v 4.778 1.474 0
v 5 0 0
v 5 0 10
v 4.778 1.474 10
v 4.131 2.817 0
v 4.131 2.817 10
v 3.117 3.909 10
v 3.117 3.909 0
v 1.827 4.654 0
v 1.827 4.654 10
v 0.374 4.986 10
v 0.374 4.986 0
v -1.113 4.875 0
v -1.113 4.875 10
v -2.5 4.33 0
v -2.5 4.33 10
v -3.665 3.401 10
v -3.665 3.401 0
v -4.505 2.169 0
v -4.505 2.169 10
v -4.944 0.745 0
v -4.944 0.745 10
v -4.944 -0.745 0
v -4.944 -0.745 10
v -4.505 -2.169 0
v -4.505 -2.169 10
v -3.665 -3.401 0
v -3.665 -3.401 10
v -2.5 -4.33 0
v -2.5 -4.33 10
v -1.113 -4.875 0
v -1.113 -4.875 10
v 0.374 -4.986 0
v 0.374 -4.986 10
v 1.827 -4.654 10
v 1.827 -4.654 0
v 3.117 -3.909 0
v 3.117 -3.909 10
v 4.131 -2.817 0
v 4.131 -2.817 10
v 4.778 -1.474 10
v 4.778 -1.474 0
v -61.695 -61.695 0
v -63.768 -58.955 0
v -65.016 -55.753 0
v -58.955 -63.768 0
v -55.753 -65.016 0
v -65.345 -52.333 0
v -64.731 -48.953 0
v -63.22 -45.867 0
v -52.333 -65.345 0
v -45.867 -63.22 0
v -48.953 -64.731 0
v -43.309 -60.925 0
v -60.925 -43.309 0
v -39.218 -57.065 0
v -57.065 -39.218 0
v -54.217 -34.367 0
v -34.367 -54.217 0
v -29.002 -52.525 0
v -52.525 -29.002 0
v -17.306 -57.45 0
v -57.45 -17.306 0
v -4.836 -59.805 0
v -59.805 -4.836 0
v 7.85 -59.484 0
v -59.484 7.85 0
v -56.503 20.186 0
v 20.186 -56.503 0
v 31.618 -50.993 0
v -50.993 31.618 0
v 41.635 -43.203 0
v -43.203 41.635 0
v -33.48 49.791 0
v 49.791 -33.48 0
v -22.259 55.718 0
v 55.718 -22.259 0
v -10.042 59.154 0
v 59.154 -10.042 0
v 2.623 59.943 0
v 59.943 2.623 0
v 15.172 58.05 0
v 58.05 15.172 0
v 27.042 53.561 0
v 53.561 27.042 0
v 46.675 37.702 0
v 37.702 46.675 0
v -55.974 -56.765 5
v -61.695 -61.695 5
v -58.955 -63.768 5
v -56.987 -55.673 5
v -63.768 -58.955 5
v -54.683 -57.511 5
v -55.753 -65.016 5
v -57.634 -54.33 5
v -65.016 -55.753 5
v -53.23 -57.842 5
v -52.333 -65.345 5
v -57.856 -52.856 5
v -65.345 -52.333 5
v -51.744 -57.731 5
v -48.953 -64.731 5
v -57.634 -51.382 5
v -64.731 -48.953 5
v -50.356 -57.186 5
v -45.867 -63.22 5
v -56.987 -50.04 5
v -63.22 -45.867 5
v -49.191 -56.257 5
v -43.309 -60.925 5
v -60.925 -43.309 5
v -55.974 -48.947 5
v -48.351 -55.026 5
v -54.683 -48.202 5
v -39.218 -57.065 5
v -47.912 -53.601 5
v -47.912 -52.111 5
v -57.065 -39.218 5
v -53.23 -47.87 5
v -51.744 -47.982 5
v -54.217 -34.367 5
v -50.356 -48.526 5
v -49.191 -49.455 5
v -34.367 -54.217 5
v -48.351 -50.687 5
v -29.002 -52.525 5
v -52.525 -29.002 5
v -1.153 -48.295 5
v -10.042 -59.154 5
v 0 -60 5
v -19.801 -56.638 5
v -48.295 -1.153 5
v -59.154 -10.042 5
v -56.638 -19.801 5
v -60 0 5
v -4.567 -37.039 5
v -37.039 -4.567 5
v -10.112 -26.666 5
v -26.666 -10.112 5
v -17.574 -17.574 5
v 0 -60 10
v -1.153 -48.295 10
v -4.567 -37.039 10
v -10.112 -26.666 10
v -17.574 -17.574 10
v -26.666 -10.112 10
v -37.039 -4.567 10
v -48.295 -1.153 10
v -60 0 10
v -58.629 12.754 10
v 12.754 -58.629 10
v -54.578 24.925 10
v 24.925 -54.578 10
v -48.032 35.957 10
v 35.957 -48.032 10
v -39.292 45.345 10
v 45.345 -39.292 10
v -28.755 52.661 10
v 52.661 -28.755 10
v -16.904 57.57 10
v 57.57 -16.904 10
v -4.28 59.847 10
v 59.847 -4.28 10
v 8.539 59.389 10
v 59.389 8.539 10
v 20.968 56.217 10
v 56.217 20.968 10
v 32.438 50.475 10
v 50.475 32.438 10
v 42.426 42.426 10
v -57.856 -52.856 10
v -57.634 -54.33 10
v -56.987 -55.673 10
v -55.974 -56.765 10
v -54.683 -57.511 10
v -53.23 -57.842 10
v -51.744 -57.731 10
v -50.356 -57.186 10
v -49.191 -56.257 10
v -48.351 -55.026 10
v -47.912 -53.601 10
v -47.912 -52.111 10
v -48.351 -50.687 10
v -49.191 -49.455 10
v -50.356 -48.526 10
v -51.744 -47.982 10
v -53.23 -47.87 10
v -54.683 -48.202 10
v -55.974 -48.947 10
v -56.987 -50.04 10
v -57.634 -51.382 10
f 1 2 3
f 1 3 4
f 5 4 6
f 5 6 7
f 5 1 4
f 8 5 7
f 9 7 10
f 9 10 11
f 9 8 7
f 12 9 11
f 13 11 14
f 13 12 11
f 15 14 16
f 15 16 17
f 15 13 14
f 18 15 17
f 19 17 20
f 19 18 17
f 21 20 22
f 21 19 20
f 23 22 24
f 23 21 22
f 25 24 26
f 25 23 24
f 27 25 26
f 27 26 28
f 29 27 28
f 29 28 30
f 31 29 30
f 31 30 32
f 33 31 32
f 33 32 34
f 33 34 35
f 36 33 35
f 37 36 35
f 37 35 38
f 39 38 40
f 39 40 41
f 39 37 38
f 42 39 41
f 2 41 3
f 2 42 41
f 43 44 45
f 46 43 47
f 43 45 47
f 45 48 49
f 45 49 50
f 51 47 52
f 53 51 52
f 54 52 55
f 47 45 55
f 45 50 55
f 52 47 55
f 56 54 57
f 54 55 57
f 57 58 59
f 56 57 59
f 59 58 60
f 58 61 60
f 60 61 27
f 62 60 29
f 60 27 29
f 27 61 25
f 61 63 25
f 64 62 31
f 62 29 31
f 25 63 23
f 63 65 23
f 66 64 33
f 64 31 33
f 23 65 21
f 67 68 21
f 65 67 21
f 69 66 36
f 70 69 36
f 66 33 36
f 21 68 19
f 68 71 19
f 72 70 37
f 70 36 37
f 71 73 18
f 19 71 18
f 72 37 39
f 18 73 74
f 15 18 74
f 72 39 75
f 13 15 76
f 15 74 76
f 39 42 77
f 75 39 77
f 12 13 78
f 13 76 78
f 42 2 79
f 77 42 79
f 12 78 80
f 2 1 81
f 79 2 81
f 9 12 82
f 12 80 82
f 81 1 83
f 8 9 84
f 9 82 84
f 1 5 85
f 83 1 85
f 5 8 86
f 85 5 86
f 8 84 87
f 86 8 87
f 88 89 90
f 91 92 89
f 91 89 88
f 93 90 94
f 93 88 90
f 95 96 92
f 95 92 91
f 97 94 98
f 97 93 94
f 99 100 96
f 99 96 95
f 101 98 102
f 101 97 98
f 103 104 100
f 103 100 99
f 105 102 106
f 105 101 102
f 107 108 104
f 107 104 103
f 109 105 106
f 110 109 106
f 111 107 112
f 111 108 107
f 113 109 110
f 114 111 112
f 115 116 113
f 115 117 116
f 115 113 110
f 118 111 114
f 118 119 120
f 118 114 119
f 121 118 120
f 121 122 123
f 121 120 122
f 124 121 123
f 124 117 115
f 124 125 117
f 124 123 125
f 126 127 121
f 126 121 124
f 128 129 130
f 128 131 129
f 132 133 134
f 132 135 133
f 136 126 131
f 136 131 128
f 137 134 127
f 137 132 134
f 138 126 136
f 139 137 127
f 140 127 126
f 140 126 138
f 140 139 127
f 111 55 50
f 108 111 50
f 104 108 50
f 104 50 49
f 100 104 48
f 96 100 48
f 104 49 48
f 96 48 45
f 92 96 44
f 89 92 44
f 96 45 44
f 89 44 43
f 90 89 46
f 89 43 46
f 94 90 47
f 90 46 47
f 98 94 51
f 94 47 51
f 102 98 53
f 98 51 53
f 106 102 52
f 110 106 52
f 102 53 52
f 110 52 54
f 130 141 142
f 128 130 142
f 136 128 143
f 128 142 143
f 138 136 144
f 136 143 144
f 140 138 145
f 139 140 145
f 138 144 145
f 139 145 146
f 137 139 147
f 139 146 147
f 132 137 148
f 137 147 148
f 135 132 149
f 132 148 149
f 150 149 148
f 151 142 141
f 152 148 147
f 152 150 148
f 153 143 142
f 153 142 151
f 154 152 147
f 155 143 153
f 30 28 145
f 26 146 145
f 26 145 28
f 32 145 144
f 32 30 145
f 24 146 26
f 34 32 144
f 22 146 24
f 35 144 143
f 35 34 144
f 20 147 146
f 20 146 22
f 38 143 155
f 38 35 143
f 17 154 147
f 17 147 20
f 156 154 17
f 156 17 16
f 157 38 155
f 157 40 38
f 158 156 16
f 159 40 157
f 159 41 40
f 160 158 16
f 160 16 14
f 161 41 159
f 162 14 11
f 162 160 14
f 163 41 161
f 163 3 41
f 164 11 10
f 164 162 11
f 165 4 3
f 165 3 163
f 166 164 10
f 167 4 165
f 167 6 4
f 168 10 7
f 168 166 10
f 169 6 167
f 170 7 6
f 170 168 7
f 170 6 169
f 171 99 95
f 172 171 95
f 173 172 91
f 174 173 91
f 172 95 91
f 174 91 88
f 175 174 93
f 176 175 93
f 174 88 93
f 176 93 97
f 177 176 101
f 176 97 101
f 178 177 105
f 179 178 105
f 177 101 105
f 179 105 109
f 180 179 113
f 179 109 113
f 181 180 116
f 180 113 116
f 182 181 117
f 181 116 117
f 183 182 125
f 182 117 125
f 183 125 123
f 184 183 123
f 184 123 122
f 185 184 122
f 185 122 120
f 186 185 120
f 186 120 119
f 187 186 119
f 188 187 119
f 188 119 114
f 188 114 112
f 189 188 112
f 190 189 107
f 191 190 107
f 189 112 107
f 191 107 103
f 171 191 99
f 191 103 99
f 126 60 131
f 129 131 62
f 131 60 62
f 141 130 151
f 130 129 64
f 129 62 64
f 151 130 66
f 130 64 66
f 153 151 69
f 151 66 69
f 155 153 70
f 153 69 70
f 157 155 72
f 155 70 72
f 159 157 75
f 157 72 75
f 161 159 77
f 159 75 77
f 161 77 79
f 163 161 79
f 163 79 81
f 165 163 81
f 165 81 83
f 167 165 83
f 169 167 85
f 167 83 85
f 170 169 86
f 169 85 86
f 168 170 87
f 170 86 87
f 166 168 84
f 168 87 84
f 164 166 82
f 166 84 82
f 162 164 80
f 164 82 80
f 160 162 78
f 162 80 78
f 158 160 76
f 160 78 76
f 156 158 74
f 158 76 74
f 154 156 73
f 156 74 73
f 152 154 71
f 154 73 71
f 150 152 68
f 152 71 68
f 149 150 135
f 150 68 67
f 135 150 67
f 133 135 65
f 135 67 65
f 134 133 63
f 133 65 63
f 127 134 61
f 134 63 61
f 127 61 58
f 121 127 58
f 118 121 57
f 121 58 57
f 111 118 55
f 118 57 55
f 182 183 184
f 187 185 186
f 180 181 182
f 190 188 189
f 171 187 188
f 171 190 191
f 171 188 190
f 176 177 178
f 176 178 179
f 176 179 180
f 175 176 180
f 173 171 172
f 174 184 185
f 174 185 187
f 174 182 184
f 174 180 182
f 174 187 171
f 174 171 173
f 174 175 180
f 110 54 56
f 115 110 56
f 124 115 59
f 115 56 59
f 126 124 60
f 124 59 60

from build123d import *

# Parameters (mm, degrees)
SKICA1_R                 = 60
SKICA1_R_2               = 5
P_IDAT_VYSUNUT_M1_DEPTH  = 10
ODEBRAT_VYSUNUT_M1_DEPTH = 5
P_IDAT_VYSUNUT_M2_DEPTH  = 5
SKICA5_R                 = 5
P_IDAT_VYSUNUT_M3_DEPTH  = 5


with BuildPart() as part:
    # Skica1 → Přidat vysunutím1 (new body)
    with BuildSketch(Plane.XY):
        Circle(SKICA1_R)
        Circle(SKICA1_R_2, mode=Mode.SUBTRACT)
    extrude(amount=P_IDAT_VYSUNUT_M1_DEPTH)

    # Skica2 → Odebrat vysunutím1 (cut)
    with BuildSketch(Plane.XY.offset(10)):
        with BuildLine():
            Line((-60, 0), (-60, -60))
            Line((-60, -60), (0, -60))
            ThreePointArc((0, -60), (-17.573593129, -17.573593129), (-60, 0))
        make_face()
    extrude(amount=-ODEBRAT_VYSUNUT_M1_DEPTH, mode=Mode.SUBTRACT)

    # Skica4 → Přidat vysunutím2 (add)
    with BuildSketch(Plane(origin=(0, 0, 0), x_dir=(-1, 0, 0), z_dir=(0, 0, -1))):
        with BuildLine():
            ThreePointArc((29.001731724, -52.525227815), (42.426406871, -42.426406871), (52.525227815, -29.001731724))
            ThreePointArc((52.525227815, -29.001731724), (55.503659439, -36.872652673), (60.925083435, -43.309314338))
            ThreePointArc((60.925083435, -43.309314338), (61.695066659, -61.695066659), (43.309314338, -60.925083435))
            ThreePointArc((43.309314338, -60.925083435), (36.872652673, -55.503659439), (29.001731724, -52.525227815))
        make_face()
    extrude(amount=-P_IDAT_VYSUNUT_M2_DEPTH)

    # Skica5 → Přidat vysunutím3 (add)
    with BuildSketch(Plane.XY.offset(5)):
        with Locations(Location((-52.856231894, -52.856231894, 0), (0, 0, 180))):
            Circle(SKICA5_R)
    extrude(amount=P_IDAT_VYSUNUT_M3_DEPTH)


solid = part.part
